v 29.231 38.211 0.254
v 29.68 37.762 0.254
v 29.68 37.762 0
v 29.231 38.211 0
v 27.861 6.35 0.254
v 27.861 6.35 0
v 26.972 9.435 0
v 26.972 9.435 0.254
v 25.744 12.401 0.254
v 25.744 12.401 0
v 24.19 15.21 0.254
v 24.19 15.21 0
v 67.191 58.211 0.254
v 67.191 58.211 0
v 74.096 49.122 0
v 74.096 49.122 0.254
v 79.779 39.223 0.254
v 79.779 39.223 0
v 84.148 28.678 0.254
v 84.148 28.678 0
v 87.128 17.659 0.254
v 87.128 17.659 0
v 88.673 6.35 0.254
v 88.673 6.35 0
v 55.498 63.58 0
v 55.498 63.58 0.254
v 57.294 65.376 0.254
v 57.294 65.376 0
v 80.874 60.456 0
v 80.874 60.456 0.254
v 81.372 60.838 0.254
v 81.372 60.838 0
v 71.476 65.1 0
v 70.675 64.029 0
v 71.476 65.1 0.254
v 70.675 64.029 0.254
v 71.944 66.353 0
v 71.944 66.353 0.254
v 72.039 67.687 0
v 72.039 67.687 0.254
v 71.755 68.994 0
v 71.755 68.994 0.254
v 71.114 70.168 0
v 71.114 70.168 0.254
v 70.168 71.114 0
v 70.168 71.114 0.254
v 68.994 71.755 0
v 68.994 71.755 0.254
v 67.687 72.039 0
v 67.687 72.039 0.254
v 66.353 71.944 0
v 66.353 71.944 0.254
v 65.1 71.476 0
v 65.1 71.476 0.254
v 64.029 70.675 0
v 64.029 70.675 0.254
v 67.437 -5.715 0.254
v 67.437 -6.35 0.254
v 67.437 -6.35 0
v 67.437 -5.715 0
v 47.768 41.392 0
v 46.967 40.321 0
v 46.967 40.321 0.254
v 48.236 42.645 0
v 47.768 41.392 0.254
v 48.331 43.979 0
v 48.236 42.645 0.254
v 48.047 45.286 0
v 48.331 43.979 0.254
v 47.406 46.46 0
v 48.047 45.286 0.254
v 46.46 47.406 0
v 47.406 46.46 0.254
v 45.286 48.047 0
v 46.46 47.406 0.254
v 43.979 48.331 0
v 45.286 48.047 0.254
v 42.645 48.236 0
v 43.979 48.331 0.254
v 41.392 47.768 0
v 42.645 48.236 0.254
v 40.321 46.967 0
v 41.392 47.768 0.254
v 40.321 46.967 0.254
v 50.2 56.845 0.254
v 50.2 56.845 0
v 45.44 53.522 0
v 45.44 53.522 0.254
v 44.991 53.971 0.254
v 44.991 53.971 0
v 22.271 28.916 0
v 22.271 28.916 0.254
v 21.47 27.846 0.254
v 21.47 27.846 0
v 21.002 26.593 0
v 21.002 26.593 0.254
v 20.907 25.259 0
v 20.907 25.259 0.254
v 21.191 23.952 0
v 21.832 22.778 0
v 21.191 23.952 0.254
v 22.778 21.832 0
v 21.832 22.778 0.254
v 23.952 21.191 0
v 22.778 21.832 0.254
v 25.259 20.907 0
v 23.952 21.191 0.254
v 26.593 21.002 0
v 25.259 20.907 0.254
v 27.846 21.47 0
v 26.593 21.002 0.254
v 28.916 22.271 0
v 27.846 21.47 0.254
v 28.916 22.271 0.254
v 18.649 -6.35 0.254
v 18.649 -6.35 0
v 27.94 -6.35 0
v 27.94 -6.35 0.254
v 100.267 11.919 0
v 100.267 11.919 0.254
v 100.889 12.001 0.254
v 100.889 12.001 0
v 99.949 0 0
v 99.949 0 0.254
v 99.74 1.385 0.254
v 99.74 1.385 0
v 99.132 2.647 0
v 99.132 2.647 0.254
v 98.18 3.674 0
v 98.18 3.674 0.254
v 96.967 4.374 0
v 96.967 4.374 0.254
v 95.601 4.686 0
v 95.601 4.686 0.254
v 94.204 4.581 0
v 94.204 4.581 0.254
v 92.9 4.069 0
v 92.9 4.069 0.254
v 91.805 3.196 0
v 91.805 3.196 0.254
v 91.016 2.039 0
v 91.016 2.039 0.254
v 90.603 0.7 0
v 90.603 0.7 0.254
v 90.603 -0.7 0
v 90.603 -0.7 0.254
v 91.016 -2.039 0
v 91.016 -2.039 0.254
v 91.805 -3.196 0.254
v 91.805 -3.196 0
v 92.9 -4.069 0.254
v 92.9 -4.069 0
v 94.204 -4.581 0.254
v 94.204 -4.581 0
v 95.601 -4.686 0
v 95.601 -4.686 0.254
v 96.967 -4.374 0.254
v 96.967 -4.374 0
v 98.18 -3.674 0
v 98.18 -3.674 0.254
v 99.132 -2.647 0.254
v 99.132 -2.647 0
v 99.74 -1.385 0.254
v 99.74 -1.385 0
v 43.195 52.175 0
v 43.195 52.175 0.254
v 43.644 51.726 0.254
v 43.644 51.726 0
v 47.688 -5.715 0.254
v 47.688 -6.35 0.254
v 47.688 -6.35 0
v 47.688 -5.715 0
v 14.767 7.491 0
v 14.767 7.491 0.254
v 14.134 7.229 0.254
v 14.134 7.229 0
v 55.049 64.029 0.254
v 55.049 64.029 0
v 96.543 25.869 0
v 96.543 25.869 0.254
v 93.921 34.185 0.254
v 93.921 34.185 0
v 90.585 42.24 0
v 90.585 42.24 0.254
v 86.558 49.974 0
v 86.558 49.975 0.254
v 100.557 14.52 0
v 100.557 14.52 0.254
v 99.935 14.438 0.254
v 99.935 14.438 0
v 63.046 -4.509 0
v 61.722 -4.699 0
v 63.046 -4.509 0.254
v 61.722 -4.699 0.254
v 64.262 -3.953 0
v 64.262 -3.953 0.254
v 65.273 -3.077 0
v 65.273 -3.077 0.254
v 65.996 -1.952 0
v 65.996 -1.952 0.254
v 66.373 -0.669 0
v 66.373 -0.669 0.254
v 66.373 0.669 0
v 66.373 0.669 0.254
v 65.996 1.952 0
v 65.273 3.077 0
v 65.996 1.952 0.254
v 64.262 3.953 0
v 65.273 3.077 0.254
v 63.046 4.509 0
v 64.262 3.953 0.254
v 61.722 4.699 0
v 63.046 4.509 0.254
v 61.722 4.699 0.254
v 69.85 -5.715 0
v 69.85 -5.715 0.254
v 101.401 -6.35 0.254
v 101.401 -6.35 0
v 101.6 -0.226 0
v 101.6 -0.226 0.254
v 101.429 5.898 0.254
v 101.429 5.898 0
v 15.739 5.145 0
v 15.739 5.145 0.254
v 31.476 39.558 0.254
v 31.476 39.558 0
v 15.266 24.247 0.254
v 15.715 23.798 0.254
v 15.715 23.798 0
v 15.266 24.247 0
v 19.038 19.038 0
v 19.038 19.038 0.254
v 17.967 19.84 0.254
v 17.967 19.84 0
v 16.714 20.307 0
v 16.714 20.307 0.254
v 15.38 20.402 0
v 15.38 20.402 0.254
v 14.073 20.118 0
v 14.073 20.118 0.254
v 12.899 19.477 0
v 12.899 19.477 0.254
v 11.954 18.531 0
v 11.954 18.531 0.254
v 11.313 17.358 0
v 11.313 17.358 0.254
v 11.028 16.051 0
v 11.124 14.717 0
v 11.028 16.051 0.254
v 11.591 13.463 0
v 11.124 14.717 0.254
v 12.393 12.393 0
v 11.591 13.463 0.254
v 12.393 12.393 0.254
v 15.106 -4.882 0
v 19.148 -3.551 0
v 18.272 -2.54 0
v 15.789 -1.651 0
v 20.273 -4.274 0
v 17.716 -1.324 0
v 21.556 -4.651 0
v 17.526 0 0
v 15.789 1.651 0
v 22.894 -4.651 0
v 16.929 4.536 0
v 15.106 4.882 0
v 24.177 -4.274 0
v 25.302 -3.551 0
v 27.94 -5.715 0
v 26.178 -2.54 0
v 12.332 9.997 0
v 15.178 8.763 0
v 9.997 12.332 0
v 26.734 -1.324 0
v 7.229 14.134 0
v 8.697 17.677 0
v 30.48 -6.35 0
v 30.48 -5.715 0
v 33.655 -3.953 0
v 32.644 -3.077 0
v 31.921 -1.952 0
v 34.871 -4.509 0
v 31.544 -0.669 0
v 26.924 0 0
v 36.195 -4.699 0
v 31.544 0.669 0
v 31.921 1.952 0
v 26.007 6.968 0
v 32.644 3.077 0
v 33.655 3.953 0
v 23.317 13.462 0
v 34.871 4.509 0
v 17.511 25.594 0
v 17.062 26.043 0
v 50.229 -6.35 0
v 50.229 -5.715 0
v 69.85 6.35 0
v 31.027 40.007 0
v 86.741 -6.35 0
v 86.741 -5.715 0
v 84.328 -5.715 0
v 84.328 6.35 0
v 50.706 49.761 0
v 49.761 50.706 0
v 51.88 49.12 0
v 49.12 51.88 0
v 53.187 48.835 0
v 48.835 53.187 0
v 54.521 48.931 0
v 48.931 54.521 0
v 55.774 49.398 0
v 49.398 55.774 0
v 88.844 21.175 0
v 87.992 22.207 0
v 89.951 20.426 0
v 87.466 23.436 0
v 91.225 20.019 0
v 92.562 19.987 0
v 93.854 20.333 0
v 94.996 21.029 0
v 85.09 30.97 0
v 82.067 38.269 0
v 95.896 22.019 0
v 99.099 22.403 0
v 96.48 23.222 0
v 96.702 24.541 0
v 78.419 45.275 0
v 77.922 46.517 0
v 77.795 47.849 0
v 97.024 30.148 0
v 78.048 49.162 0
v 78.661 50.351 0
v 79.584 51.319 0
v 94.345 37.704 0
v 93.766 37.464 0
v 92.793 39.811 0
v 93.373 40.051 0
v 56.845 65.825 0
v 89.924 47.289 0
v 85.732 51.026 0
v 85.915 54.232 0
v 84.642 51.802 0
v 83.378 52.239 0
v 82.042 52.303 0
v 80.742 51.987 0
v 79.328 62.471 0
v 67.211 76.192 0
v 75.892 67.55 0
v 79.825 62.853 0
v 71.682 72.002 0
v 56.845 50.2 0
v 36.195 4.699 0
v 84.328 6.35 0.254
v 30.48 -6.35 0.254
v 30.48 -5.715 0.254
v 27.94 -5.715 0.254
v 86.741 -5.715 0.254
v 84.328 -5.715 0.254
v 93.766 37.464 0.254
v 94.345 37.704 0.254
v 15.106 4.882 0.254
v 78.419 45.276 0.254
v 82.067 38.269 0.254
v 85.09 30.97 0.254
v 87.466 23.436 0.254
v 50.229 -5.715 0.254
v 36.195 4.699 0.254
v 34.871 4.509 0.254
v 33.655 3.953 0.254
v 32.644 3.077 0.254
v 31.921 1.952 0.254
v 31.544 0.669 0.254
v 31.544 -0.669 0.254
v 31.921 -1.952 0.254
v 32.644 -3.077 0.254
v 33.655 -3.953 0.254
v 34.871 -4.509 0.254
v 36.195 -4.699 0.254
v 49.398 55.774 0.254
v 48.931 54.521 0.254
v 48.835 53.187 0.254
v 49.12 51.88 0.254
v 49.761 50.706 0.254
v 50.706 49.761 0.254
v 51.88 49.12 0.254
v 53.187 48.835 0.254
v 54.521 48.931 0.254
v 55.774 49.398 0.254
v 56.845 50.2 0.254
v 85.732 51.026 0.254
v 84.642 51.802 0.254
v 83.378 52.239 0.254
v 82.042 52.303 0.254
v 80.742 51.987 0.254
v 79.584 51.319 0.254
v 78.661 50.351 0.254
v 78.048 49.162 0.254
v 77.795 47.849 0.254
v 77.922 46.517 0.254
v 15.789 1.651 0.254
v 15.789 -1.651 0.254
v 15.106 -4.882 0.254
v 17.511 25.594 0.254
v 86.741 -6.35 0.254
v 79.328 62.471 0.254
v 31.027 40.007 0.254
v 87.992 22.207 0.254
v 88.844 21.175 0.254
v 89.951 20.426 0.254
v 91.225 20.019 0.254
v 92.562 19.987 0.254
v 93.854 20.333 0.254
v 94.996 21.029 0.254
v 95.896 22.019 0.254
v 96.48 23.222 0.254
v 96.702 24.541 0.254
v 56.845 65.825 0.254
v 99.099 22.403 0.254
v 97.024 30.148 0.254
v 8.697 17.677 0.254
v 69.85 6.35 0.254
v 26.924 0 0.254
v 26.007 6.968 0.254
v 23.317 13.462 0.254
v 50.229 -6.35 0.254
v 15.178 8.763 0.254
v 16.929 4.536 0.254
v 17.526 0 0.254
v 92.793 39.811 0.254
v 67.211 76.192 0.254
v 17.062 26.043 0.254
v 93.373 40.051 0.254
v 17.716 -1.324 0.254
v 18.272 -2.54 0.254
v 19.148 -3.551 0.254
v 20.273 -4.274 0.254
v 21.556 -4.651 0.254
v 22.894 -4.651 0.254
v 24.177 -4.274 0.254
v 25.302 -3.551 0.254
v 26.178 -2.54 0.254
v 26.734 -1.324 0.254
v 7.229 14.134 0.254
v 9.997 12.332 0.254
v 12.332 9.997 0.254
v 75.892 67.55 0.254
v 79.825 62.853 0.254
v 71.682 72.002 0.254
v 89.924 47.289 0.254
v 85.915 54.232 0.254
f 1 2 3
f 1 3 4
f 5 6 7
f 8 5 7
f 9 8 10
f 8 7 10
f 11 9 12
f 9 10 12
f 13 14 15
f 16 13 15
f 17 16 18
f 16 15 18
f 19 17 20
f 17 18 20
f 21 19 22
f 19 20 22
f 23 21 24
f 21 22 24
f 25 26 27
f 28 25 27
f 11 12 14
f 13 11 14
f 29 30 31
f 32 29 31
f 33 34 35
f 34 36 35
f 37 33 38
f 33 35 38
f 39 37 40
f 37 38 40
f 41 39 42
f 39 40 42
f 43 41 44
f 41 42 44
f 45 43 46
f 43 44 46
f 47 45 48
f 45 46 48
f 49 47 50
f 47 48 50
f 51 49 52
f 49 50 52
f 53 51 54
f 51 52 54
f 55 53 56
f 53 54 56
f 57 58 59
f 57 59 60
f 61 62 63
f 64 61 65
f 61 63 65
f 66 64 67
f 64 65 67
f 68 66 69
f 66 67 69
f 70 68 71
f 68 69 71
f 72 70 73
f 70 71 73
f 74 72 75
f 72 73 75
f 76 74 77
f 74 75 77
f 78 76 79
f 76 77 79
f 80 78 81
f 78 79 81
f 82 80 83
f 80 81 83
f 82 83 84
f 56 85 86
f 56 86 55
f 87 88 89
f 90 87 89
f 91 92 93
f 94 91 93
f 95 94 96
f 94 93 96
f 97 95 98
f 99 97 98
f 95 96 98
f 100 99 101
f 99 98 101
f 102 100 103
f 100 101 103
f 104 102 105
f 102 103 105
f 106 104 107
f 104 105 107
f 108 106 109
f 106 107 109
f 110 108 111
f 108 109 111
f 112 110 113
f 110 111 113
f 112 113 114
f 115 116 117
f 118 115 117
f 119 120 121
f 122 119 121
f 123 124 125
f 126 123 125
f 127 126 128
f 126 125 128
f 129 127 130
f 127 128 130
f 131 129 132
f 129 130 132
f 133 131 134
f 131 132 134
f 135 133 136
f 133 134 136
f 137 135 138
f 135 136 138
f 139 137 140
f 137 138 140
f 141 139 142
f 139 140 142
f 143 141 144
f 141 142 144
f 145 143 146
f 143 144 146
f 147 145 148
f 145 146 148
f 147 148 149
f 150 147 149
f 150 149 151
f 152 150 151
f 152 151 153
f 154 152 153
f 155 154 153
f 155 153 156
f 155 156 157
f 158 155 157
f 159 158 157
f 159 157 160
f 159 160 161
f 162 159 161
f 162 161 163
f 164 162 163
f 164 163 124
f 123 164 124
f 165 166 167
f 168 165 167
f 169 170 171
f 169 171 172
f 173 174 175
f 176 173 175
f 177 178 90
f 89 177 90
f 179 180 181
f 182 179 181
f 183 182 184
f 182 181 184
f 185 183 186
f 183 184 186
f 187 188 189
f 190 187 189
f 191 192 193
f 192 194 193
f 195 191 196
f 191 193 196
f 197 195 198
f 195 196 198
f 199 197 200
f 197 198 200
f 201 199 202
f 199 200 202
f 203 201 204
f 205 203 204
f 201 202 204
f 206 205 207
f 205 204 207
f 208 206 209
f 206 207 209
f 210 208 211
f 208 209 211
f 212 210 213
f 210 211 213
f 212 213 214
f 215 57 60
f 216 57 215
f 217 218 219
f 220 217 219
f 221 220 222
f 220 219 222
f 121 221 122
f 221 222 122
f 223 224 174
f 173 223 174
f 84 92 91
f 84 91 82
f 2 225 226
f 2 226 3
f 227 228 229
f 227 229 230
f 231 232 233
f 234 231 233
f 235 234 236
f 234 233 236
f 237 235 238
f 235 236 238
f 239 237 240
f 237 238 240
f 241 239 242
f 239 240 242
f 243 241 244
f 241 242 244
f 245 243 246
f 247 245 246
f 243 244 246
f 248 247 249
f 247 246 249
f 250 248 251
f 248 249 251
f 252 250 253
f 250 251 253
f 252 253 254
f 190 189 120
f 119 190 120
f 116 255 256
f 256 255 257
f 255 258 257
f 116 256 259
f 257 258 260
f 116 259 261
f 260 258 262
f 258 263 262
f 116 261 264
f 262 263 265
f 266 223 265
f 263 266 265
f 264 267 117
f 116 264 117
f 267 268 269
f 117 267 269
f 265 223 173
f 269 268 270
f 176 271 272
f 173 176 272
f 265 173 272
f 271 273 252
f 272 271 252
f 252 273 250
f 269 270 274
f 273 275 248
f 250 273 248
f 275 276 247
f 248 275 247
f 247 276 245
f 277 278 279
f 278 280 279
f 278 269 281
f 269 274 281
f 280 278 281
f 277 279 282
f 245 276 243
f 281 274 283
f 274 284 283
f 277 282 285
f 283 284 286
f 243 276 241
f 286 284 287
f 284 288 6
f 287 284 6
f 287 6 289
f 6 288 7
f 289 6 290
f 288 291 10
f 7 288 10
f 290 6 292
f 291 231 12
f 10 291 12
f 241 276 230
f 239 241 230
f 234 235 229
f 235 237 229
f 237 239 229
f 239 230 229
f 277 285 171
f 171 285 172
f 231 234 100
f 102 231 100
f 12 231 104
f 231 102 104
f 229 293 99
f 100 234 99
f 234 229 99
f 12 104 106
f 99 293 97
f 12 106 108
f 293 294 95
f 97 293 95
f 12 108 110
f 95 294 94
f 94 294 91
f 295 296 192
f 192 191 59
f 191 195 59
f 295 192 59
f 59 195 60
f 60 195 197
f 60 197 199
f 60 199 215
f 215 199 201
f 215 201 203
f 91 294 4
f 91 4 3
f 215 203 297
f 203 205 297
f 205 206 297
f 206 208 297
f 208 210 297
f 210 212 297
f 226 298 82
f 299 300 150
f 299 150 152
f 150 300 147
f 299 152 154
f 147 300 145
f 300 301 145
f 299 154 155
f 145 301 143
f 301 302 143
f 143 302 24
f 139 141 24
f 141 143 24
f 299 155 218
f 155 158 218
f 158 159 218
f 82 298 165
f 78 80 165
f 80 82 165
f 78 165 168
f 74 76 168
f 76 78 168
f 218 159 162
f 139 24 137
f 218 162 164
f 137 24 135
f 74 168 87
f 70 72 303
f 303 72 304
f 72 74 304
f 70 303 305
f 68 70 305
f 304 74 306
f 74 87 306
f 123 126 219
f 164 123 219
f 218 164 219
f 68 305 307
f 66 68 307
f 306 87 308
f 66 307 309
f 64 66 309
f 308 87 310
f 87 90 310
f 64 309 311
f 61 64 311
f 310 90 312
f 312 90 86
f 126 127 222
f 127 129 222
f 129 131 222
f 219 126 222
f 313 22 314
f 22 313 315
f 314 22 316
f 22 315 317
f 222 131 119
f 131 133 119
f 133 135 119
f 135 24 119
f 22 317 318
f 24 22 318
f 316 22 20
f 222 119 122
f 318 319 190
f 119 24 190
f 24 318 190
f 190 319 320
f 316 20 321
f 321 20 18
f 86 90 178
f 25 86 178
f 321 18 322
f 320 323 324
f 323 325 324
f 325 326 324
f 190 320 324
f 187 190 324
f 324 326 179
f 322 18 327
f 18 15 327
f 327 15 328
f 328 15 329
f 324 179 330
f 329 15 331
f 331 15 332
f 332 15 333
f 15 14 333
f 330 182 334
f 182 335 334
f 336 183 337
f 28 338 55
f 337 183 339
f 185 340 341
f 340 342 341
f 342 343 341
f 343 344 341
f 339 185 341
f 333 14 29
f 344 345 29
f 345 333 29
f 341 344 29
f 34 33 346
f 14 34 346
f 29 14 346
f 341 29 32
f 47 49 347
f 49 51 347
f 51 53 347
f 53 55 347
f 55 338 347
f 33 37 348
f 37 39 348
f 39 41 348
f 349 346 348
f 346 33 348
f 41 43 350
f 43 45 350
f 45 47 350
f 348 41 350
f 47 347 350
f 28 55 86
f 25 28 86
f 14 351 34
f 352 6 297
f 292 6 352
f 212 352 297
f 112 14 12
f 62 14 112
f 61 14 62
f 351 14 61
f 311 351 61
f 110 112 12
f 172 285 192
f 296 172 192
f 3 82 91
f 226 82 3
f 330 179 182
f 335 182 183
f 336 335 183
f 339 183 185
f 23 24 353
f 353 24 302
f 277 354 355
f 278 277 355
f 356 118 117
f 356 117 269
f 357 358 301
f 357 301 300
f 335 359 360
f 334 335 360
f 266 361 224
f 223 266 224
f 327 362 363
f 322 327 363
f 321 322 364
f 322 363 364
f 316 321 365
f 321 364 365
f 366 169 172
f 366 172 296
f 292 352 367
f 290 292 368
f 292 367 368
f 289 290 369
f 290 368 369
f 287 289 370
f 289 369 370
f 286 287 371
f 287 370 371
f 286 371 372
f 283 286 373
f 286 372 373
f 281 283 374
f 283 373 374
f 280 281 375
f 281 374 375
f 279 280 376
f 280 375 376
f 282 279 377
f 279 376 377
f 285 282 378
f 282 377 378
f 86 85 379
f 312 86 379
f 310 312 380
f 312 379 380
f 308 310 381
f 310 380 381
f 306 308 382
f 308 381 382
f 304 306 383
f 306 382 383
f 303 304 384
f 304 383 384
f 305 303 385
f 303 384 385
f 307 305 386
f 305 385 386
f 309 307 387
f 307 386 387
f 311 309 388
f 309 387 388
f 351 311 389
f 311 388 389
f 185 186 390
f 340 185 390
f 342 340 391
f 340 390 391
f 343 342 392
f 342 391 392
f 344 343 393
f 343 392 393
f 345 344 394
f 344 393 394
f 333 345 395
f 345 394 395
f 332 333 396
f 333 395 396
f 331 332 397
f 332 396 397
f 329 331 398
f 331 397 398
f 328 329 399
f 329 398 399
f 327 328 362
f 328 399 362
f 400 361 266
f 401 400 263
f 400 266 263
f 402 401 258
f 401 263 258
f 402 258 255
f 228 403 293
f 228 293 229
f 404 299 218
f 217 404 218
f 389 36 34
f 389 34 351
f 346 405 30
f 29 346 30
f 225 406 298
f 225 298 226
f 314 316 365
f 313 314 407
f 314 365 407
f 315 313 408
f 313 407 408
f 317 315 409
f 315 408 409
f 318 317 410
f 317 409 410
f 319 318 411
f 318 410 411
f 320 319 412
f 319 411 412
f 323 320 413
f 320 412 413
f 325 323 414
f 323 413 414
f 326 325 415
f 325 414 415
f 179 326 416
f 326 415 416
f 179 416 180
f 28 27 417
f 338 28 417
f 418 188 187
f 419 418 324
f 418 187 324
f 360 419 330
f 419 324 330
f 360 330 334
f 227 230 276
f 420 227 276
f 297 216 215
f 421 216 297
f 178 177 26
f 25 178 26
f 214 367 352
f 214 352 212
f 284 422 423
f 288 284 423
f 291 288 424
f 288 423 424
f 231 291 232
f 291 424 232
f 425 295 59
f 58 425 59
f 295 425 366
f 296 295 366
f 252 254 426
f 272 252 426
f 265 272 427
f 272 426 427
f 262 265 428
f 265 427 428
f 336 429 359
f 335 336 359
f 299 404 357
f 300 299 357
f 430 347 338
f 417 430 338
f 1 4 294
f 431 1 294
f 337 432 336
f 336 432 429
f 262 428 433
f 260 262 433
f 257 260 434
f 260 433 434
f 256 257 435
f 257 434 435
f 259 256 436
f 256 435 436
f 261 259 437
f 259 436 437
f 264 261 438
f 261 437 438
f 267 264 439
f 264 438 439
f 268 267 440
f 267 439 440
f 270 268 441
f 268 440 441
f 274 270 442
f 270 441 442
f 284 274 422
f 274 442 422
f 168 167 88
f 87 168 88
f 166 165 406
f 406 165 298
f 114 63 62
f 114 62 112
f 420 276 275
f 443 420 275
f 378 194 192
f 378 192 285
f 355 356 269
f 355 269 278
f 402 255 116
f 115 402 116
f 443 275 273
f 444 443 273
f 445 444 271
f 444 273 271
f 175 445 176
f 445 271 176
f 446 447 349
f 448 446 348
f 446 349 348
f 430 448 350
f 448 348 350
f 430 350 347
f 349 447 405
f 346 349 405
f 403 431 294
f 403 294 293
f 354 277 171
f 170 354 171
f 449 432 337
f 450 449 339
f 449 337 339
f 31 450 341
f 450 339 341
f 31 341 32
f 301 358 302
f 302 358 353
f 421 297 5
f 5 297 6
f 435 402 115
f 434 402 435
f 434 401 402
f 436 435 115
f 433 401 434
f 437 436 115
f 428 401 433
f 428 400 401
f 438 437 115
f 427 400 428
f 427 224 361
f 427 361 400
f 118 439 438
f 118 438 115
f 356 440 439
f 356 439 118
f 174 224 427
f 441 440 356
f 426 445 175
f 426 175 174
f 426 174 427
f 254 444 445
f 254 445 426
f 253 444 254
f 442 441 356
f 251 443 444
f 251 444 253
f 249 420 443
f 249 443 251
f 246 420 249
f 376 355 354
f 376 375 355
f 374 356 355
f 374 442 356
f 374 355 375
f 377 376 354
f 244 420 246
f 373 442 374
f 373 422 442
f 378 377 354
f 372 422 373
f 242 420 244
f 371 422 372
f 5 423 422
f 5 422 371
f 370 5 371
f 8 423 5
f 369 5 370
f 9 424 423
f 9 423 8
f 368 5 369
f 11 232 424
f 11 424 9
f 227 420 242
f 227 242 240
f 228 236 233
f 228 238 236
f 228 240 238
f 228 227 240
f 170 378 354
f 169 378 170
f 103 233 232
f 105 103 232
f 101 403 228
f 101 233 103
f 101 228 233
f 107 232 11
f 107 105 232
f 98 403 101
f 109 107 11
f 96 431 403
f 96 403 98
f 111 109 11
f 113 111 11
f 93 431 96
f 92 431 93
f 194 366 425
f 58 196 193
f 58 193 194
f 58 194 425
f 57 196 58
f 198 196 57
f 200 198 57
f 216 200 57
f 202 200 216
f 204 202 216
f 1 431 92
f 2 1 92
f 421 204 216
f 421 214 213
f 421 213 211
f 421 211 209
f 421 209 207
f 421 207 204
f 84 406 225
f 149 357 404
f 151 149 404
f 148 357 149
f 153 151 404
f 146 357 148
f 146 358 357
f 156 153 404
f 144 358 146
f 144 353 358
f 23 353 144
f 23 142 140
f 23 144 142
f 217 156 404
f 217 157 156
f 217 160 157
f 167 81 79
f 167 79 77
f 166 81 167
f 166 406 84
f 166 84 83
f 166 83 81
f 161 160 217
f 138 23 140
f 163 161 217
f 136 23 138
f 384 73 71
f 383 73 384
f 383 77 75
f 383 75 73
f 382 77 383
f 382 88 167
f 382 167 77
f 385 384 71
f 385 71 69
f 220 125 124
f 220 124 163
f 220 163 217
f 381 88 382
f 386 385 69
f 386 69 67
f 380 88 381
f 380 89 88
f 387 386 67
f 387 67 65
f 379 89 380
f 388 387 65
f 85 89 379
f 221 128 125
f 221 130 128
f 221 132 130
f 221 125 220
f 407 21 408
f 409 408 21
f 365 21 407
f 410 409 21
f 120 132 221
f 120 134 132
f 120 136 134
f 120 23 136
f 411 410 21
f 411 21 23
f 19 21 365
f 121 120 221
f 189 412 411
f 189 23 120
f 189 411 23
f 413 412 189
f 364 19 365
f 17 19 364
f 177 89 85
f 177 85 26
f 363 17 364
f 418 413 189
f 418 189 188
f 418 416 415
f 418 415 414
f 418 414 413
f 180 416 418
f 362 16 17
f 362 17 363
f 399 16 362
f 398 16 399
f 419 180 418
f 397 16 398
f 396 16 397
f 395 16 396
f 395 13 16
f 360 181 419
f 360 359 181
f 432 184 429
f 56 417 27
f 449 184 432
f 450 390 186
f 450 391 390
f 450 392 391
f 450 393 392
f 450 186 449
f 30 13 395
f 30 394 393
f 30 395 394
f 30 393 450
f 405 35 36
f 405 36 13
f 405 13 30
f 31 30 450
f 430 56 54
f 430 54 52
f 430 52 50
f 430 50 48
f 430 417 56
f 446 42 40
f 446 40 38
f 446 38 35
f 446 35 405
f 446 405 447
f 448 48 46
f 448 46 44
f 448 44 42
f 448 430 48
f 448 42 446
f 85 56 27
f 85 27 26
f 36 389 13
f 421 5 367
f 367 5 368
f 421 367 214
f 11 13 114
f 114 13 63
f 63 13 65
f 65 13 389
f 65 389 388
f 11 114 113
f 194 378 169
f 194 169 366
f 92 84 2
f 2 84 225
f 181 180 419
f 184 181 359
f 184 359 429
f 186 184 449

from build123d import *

# Parameters (mm, degrees)
BOSS_EXTRUDE1_DEPTH = 0.254
SKETCH2_R           = 4.699
CUT_EXTRUDE1_DEPTH  = 1.254
SKETCH3_W           = 2.54
SKETCH3_H           = 0.635
CUT_EXTRUDE2_DEPTH  = 1.254
CUT_EXTRUDE4_DEPTH  = 1.254
SKETCH5_W           = 14.478
SKETCH5_H           = 15.24
CUT_EXTRUDE5_DEPTH  = 1.254


with BuildPart() as part:
    # Sketch1 → Boss-Extrude1 (new body)
    with BuildSketch(Plane.XY):
        with BuildLine():
            Line((67.21146711, 76.191723231), (8.696654013, 17.676910134))
            Line((8.696654013, 17.676910134), (7.228954972, 14.133571205))
            ThreePointArc((7.228954972, 14.133571205), (14.666587579, 6.075099489), (15.105587123, -4.88230096))
            Line((15.105587123, -4.88230096), (18.648926052, -6.35))
            Line((18.648926052, -6.35), (101.401368334, -6.35))
            ThreePointArc((101.401368334, -6.35), (93.866160503, 38.880636728), (67.21146711, 76.191723231))
        make_face()
        with BuildLine():
            Line((88.672924278, 6.35), (27.86051193, 6.35))
            ThreePointArc((27.86051193, 6.35), (26.399857642, 10.93517908), (24.190484974, 15.210228852))
            Line((24.190484974, 15.210228852), (67.191354125, 58.211098004))
            ThreePointArc((67.191354125, 58.211098004), (82.13289044, 34.020557137), (88.672924278, 6.35))
        make_face(mode=Mode.SUBTRACT)
    extrude(amount=BOSS_EXTRUDE1_DEPTH)

    # Sketch2 → Cut-Extrude1 (cut, through all)
    with BuildSketch(Plane.XY.offset(0.254)):
        with Locations((22.225, 0)):
            Circle(SKETCH2_R)
        with Locations((36.195, 0)):
            Circle(SKETCH2_R)
        with Locations((61.722, 0)):
            Circle(SKETCH2_R)
        with Locations((75.692, 0)):
            Circle(SKETCH2_R)
        with Locations((95.25, 0)):
            Circle(SKETCH2_R)
        with Locations((15.715448212, 15.715448212)):
            Circle(SKETCH2_R)
        with Locations((25.593729945, 25.593729945)):
            Circle(SKETCH2_R)
        with Locations((43.644044748, 43.644044748)):
            Circle(SKETCH2_R)
        with Locations((53.522326482, 53.522326482)):
            Circle(SKETCH2_R)
        with Locations((92.004434954, 24.652514046)):
            Circle(SKETCH2_R)
        with Locations((82.48891971, 47.625)):
            Circle(SKETCH2_R)
        with Locations((67.351920908, 67.351920908)):
            Circle(SKETCH2_R)
    extrude(amount=-CUT_EXTRUDE1_DEPTH, mode=Mode.SUBTRACT)

    # Sketch3 → Cut-Extrude2 (cut, through all)
    with BuildSketch(Plane.XY.offset(0.254)):
        Polygon((15.266435406, 24.246691527), (17.06248663, 26.042742751), (17.511499436, 25.593729945), (15.715448212, 23.797678721), align=None)
        Polygon((44.991083167, 53.971339288), (43.195031942, 52.175288063), (43.644044748, 51.726275257), (45.440095973, 53.522326482), align=None)
        with Locations((29.21, -6.0325)):
            Rectangle(SKETCH3_W, SKETCH3_H)
        with Locations((68.707, -6.0325)):
            Rectangle(SKETCH3_W, SKETCH3_H)
        Polygon((29.230733674, 38.210989795), (31.026784898, 40.007041019), (31.475797704, 39.558028213), (29.67974648, 37.761976989), align=None)
        Polygon((56.845021246, 65.825277367), (55.048970022, 64.029226143), (55.497982828, 63.580213337), (57.294034052, 65.376264561), align=None)
        with Locations((48.9585, -6.0325)):
            Rectangle(SKETCH3_W, SKETCH3_H)
        with Locations((85.471, -6.0325)):
            Rectangle(SKETCH3_W, SKETCH3_H)
        Polygon((99.935462164, 14.437711971), (100.266998693, 11.919442024), (101.526133667, 12.085210288), (101.194597138, 14.603480236), align=None)
        Polygon((93.765504959, 37.464305742), (94.938831965, 37.950313702), (93.966816047, 40.296967714), (92.793489041, 39.810959755), align=None)
        Polygon((79.327792988, 62.471156422), (80.874047017, 60.456038938), (81.88160576, 61.229165953), (80.33535173, 63.244283437), align=None)
        Polygon((13.593916116, 7.005422516), (14.565932035, 4.658768503), (15.739259041, 5.144776462), (14.767243123, 7.491430475), align=None)
    extrude(amount=-CUT_EXTRUDE2_DEPTH, mode=Mode.SUBTRACT)

    # Sketch6 → Cut-Extrude4 (cut, through all)
    with BuildSketch(Plane.XY.offset(0.254)):
        with BuildLine():
            Line((22.27103518, 28.91642471), (40.321349984, 46.966739513))
            ThreePointArc((40.321349984, 46.966739513), (46.966739513, 46.966739513), (46.966739513, 40.321349984))
            Line((46.966739513, 40.321349984), (28.91642471, 22.27103518))
            ThreePointArc((28.91642471, 22.27103518), (22.27103518, 22.27103518), (22.27103518, 28.91642471))
        make_face()
        with BuildLine():
            Line((50.199631717, 56.845021246), (64.029226143, 70.674615673))
            ThreePointArc((64.029226143, 70.674615673), (70.674615673, 70.674615673), (70.674615673, 64.029226143))
            Line((70.674615673, 64.029226143), (56.845021246, 50.199631717))
            ThreePointArc((56.845021246, 50.199631717), (50.199631717, 50.199631717), (50.199631717, 56.845021246))
        make_face()
        with BuildLine():
            Line((61.722, -4.699), (36.195, -4.699))
            ThreePointArc((36.195, -4.699), (31.496, 0), (36.195, 4.699))
            Line((36.195, 4.699), (61.722, 4.699))
            ThreePointArc((61.722, 4.699), (66.421, 0), (61.722, -4.699))
        make_face()
        with BuildLine():
            ThreePointArc((26.924, 0), (24.874532533, 10.303368733), (19.038142977, 19.038142977))
            ThreePointArc((19.038142977, 19.038142977), (12.392753447, 19.038142977), (12.392753447, 12.392753447))
            ThreePointArc((12.392753447, 12.392753447), (16.191912687, 6.706909836), (17.526, 0))
            ThreePointArc((17.526, 0), (22.225, -4.699), (26.924, 0))
        make_face()
        with BuildLine():
            ThreePointArc((96.543320412, 25.868704739), (92.340835395, 38.248826381), (86.558373083, 49.9745))
            ThreePointArc((86.558373083, 49.9745), (80.13941971, 51.694453372), (78.419466338, 45.2755))
            ThreePointArc((78.419466338, 45.2755), (83.658215548, 34.652367484), (87.465549496, 23.436323353))
            ThreePointArc((87.465549496, 23.436323353), (93.220625647, 20.113628588), (96.543320412, 25.868704739))
        make_face()
    extrude(amount=-CUT_EXTRUDE4_DEPTH, mode=Mode.SUBTRACT)

    # Sketch5 → Cut-Extrude5 (cut, through all)
    with BuildSketch(Plane.XY.offset(0.254)):
        with Locations((77.089, 0)):
            Rectangle(SKETCH5_W, SKETCH5_H)
    extrude(amount=-CUT_EXTRUDE5_DEPTH, mode=Mode.SUBTRACT)


solid = part.part
